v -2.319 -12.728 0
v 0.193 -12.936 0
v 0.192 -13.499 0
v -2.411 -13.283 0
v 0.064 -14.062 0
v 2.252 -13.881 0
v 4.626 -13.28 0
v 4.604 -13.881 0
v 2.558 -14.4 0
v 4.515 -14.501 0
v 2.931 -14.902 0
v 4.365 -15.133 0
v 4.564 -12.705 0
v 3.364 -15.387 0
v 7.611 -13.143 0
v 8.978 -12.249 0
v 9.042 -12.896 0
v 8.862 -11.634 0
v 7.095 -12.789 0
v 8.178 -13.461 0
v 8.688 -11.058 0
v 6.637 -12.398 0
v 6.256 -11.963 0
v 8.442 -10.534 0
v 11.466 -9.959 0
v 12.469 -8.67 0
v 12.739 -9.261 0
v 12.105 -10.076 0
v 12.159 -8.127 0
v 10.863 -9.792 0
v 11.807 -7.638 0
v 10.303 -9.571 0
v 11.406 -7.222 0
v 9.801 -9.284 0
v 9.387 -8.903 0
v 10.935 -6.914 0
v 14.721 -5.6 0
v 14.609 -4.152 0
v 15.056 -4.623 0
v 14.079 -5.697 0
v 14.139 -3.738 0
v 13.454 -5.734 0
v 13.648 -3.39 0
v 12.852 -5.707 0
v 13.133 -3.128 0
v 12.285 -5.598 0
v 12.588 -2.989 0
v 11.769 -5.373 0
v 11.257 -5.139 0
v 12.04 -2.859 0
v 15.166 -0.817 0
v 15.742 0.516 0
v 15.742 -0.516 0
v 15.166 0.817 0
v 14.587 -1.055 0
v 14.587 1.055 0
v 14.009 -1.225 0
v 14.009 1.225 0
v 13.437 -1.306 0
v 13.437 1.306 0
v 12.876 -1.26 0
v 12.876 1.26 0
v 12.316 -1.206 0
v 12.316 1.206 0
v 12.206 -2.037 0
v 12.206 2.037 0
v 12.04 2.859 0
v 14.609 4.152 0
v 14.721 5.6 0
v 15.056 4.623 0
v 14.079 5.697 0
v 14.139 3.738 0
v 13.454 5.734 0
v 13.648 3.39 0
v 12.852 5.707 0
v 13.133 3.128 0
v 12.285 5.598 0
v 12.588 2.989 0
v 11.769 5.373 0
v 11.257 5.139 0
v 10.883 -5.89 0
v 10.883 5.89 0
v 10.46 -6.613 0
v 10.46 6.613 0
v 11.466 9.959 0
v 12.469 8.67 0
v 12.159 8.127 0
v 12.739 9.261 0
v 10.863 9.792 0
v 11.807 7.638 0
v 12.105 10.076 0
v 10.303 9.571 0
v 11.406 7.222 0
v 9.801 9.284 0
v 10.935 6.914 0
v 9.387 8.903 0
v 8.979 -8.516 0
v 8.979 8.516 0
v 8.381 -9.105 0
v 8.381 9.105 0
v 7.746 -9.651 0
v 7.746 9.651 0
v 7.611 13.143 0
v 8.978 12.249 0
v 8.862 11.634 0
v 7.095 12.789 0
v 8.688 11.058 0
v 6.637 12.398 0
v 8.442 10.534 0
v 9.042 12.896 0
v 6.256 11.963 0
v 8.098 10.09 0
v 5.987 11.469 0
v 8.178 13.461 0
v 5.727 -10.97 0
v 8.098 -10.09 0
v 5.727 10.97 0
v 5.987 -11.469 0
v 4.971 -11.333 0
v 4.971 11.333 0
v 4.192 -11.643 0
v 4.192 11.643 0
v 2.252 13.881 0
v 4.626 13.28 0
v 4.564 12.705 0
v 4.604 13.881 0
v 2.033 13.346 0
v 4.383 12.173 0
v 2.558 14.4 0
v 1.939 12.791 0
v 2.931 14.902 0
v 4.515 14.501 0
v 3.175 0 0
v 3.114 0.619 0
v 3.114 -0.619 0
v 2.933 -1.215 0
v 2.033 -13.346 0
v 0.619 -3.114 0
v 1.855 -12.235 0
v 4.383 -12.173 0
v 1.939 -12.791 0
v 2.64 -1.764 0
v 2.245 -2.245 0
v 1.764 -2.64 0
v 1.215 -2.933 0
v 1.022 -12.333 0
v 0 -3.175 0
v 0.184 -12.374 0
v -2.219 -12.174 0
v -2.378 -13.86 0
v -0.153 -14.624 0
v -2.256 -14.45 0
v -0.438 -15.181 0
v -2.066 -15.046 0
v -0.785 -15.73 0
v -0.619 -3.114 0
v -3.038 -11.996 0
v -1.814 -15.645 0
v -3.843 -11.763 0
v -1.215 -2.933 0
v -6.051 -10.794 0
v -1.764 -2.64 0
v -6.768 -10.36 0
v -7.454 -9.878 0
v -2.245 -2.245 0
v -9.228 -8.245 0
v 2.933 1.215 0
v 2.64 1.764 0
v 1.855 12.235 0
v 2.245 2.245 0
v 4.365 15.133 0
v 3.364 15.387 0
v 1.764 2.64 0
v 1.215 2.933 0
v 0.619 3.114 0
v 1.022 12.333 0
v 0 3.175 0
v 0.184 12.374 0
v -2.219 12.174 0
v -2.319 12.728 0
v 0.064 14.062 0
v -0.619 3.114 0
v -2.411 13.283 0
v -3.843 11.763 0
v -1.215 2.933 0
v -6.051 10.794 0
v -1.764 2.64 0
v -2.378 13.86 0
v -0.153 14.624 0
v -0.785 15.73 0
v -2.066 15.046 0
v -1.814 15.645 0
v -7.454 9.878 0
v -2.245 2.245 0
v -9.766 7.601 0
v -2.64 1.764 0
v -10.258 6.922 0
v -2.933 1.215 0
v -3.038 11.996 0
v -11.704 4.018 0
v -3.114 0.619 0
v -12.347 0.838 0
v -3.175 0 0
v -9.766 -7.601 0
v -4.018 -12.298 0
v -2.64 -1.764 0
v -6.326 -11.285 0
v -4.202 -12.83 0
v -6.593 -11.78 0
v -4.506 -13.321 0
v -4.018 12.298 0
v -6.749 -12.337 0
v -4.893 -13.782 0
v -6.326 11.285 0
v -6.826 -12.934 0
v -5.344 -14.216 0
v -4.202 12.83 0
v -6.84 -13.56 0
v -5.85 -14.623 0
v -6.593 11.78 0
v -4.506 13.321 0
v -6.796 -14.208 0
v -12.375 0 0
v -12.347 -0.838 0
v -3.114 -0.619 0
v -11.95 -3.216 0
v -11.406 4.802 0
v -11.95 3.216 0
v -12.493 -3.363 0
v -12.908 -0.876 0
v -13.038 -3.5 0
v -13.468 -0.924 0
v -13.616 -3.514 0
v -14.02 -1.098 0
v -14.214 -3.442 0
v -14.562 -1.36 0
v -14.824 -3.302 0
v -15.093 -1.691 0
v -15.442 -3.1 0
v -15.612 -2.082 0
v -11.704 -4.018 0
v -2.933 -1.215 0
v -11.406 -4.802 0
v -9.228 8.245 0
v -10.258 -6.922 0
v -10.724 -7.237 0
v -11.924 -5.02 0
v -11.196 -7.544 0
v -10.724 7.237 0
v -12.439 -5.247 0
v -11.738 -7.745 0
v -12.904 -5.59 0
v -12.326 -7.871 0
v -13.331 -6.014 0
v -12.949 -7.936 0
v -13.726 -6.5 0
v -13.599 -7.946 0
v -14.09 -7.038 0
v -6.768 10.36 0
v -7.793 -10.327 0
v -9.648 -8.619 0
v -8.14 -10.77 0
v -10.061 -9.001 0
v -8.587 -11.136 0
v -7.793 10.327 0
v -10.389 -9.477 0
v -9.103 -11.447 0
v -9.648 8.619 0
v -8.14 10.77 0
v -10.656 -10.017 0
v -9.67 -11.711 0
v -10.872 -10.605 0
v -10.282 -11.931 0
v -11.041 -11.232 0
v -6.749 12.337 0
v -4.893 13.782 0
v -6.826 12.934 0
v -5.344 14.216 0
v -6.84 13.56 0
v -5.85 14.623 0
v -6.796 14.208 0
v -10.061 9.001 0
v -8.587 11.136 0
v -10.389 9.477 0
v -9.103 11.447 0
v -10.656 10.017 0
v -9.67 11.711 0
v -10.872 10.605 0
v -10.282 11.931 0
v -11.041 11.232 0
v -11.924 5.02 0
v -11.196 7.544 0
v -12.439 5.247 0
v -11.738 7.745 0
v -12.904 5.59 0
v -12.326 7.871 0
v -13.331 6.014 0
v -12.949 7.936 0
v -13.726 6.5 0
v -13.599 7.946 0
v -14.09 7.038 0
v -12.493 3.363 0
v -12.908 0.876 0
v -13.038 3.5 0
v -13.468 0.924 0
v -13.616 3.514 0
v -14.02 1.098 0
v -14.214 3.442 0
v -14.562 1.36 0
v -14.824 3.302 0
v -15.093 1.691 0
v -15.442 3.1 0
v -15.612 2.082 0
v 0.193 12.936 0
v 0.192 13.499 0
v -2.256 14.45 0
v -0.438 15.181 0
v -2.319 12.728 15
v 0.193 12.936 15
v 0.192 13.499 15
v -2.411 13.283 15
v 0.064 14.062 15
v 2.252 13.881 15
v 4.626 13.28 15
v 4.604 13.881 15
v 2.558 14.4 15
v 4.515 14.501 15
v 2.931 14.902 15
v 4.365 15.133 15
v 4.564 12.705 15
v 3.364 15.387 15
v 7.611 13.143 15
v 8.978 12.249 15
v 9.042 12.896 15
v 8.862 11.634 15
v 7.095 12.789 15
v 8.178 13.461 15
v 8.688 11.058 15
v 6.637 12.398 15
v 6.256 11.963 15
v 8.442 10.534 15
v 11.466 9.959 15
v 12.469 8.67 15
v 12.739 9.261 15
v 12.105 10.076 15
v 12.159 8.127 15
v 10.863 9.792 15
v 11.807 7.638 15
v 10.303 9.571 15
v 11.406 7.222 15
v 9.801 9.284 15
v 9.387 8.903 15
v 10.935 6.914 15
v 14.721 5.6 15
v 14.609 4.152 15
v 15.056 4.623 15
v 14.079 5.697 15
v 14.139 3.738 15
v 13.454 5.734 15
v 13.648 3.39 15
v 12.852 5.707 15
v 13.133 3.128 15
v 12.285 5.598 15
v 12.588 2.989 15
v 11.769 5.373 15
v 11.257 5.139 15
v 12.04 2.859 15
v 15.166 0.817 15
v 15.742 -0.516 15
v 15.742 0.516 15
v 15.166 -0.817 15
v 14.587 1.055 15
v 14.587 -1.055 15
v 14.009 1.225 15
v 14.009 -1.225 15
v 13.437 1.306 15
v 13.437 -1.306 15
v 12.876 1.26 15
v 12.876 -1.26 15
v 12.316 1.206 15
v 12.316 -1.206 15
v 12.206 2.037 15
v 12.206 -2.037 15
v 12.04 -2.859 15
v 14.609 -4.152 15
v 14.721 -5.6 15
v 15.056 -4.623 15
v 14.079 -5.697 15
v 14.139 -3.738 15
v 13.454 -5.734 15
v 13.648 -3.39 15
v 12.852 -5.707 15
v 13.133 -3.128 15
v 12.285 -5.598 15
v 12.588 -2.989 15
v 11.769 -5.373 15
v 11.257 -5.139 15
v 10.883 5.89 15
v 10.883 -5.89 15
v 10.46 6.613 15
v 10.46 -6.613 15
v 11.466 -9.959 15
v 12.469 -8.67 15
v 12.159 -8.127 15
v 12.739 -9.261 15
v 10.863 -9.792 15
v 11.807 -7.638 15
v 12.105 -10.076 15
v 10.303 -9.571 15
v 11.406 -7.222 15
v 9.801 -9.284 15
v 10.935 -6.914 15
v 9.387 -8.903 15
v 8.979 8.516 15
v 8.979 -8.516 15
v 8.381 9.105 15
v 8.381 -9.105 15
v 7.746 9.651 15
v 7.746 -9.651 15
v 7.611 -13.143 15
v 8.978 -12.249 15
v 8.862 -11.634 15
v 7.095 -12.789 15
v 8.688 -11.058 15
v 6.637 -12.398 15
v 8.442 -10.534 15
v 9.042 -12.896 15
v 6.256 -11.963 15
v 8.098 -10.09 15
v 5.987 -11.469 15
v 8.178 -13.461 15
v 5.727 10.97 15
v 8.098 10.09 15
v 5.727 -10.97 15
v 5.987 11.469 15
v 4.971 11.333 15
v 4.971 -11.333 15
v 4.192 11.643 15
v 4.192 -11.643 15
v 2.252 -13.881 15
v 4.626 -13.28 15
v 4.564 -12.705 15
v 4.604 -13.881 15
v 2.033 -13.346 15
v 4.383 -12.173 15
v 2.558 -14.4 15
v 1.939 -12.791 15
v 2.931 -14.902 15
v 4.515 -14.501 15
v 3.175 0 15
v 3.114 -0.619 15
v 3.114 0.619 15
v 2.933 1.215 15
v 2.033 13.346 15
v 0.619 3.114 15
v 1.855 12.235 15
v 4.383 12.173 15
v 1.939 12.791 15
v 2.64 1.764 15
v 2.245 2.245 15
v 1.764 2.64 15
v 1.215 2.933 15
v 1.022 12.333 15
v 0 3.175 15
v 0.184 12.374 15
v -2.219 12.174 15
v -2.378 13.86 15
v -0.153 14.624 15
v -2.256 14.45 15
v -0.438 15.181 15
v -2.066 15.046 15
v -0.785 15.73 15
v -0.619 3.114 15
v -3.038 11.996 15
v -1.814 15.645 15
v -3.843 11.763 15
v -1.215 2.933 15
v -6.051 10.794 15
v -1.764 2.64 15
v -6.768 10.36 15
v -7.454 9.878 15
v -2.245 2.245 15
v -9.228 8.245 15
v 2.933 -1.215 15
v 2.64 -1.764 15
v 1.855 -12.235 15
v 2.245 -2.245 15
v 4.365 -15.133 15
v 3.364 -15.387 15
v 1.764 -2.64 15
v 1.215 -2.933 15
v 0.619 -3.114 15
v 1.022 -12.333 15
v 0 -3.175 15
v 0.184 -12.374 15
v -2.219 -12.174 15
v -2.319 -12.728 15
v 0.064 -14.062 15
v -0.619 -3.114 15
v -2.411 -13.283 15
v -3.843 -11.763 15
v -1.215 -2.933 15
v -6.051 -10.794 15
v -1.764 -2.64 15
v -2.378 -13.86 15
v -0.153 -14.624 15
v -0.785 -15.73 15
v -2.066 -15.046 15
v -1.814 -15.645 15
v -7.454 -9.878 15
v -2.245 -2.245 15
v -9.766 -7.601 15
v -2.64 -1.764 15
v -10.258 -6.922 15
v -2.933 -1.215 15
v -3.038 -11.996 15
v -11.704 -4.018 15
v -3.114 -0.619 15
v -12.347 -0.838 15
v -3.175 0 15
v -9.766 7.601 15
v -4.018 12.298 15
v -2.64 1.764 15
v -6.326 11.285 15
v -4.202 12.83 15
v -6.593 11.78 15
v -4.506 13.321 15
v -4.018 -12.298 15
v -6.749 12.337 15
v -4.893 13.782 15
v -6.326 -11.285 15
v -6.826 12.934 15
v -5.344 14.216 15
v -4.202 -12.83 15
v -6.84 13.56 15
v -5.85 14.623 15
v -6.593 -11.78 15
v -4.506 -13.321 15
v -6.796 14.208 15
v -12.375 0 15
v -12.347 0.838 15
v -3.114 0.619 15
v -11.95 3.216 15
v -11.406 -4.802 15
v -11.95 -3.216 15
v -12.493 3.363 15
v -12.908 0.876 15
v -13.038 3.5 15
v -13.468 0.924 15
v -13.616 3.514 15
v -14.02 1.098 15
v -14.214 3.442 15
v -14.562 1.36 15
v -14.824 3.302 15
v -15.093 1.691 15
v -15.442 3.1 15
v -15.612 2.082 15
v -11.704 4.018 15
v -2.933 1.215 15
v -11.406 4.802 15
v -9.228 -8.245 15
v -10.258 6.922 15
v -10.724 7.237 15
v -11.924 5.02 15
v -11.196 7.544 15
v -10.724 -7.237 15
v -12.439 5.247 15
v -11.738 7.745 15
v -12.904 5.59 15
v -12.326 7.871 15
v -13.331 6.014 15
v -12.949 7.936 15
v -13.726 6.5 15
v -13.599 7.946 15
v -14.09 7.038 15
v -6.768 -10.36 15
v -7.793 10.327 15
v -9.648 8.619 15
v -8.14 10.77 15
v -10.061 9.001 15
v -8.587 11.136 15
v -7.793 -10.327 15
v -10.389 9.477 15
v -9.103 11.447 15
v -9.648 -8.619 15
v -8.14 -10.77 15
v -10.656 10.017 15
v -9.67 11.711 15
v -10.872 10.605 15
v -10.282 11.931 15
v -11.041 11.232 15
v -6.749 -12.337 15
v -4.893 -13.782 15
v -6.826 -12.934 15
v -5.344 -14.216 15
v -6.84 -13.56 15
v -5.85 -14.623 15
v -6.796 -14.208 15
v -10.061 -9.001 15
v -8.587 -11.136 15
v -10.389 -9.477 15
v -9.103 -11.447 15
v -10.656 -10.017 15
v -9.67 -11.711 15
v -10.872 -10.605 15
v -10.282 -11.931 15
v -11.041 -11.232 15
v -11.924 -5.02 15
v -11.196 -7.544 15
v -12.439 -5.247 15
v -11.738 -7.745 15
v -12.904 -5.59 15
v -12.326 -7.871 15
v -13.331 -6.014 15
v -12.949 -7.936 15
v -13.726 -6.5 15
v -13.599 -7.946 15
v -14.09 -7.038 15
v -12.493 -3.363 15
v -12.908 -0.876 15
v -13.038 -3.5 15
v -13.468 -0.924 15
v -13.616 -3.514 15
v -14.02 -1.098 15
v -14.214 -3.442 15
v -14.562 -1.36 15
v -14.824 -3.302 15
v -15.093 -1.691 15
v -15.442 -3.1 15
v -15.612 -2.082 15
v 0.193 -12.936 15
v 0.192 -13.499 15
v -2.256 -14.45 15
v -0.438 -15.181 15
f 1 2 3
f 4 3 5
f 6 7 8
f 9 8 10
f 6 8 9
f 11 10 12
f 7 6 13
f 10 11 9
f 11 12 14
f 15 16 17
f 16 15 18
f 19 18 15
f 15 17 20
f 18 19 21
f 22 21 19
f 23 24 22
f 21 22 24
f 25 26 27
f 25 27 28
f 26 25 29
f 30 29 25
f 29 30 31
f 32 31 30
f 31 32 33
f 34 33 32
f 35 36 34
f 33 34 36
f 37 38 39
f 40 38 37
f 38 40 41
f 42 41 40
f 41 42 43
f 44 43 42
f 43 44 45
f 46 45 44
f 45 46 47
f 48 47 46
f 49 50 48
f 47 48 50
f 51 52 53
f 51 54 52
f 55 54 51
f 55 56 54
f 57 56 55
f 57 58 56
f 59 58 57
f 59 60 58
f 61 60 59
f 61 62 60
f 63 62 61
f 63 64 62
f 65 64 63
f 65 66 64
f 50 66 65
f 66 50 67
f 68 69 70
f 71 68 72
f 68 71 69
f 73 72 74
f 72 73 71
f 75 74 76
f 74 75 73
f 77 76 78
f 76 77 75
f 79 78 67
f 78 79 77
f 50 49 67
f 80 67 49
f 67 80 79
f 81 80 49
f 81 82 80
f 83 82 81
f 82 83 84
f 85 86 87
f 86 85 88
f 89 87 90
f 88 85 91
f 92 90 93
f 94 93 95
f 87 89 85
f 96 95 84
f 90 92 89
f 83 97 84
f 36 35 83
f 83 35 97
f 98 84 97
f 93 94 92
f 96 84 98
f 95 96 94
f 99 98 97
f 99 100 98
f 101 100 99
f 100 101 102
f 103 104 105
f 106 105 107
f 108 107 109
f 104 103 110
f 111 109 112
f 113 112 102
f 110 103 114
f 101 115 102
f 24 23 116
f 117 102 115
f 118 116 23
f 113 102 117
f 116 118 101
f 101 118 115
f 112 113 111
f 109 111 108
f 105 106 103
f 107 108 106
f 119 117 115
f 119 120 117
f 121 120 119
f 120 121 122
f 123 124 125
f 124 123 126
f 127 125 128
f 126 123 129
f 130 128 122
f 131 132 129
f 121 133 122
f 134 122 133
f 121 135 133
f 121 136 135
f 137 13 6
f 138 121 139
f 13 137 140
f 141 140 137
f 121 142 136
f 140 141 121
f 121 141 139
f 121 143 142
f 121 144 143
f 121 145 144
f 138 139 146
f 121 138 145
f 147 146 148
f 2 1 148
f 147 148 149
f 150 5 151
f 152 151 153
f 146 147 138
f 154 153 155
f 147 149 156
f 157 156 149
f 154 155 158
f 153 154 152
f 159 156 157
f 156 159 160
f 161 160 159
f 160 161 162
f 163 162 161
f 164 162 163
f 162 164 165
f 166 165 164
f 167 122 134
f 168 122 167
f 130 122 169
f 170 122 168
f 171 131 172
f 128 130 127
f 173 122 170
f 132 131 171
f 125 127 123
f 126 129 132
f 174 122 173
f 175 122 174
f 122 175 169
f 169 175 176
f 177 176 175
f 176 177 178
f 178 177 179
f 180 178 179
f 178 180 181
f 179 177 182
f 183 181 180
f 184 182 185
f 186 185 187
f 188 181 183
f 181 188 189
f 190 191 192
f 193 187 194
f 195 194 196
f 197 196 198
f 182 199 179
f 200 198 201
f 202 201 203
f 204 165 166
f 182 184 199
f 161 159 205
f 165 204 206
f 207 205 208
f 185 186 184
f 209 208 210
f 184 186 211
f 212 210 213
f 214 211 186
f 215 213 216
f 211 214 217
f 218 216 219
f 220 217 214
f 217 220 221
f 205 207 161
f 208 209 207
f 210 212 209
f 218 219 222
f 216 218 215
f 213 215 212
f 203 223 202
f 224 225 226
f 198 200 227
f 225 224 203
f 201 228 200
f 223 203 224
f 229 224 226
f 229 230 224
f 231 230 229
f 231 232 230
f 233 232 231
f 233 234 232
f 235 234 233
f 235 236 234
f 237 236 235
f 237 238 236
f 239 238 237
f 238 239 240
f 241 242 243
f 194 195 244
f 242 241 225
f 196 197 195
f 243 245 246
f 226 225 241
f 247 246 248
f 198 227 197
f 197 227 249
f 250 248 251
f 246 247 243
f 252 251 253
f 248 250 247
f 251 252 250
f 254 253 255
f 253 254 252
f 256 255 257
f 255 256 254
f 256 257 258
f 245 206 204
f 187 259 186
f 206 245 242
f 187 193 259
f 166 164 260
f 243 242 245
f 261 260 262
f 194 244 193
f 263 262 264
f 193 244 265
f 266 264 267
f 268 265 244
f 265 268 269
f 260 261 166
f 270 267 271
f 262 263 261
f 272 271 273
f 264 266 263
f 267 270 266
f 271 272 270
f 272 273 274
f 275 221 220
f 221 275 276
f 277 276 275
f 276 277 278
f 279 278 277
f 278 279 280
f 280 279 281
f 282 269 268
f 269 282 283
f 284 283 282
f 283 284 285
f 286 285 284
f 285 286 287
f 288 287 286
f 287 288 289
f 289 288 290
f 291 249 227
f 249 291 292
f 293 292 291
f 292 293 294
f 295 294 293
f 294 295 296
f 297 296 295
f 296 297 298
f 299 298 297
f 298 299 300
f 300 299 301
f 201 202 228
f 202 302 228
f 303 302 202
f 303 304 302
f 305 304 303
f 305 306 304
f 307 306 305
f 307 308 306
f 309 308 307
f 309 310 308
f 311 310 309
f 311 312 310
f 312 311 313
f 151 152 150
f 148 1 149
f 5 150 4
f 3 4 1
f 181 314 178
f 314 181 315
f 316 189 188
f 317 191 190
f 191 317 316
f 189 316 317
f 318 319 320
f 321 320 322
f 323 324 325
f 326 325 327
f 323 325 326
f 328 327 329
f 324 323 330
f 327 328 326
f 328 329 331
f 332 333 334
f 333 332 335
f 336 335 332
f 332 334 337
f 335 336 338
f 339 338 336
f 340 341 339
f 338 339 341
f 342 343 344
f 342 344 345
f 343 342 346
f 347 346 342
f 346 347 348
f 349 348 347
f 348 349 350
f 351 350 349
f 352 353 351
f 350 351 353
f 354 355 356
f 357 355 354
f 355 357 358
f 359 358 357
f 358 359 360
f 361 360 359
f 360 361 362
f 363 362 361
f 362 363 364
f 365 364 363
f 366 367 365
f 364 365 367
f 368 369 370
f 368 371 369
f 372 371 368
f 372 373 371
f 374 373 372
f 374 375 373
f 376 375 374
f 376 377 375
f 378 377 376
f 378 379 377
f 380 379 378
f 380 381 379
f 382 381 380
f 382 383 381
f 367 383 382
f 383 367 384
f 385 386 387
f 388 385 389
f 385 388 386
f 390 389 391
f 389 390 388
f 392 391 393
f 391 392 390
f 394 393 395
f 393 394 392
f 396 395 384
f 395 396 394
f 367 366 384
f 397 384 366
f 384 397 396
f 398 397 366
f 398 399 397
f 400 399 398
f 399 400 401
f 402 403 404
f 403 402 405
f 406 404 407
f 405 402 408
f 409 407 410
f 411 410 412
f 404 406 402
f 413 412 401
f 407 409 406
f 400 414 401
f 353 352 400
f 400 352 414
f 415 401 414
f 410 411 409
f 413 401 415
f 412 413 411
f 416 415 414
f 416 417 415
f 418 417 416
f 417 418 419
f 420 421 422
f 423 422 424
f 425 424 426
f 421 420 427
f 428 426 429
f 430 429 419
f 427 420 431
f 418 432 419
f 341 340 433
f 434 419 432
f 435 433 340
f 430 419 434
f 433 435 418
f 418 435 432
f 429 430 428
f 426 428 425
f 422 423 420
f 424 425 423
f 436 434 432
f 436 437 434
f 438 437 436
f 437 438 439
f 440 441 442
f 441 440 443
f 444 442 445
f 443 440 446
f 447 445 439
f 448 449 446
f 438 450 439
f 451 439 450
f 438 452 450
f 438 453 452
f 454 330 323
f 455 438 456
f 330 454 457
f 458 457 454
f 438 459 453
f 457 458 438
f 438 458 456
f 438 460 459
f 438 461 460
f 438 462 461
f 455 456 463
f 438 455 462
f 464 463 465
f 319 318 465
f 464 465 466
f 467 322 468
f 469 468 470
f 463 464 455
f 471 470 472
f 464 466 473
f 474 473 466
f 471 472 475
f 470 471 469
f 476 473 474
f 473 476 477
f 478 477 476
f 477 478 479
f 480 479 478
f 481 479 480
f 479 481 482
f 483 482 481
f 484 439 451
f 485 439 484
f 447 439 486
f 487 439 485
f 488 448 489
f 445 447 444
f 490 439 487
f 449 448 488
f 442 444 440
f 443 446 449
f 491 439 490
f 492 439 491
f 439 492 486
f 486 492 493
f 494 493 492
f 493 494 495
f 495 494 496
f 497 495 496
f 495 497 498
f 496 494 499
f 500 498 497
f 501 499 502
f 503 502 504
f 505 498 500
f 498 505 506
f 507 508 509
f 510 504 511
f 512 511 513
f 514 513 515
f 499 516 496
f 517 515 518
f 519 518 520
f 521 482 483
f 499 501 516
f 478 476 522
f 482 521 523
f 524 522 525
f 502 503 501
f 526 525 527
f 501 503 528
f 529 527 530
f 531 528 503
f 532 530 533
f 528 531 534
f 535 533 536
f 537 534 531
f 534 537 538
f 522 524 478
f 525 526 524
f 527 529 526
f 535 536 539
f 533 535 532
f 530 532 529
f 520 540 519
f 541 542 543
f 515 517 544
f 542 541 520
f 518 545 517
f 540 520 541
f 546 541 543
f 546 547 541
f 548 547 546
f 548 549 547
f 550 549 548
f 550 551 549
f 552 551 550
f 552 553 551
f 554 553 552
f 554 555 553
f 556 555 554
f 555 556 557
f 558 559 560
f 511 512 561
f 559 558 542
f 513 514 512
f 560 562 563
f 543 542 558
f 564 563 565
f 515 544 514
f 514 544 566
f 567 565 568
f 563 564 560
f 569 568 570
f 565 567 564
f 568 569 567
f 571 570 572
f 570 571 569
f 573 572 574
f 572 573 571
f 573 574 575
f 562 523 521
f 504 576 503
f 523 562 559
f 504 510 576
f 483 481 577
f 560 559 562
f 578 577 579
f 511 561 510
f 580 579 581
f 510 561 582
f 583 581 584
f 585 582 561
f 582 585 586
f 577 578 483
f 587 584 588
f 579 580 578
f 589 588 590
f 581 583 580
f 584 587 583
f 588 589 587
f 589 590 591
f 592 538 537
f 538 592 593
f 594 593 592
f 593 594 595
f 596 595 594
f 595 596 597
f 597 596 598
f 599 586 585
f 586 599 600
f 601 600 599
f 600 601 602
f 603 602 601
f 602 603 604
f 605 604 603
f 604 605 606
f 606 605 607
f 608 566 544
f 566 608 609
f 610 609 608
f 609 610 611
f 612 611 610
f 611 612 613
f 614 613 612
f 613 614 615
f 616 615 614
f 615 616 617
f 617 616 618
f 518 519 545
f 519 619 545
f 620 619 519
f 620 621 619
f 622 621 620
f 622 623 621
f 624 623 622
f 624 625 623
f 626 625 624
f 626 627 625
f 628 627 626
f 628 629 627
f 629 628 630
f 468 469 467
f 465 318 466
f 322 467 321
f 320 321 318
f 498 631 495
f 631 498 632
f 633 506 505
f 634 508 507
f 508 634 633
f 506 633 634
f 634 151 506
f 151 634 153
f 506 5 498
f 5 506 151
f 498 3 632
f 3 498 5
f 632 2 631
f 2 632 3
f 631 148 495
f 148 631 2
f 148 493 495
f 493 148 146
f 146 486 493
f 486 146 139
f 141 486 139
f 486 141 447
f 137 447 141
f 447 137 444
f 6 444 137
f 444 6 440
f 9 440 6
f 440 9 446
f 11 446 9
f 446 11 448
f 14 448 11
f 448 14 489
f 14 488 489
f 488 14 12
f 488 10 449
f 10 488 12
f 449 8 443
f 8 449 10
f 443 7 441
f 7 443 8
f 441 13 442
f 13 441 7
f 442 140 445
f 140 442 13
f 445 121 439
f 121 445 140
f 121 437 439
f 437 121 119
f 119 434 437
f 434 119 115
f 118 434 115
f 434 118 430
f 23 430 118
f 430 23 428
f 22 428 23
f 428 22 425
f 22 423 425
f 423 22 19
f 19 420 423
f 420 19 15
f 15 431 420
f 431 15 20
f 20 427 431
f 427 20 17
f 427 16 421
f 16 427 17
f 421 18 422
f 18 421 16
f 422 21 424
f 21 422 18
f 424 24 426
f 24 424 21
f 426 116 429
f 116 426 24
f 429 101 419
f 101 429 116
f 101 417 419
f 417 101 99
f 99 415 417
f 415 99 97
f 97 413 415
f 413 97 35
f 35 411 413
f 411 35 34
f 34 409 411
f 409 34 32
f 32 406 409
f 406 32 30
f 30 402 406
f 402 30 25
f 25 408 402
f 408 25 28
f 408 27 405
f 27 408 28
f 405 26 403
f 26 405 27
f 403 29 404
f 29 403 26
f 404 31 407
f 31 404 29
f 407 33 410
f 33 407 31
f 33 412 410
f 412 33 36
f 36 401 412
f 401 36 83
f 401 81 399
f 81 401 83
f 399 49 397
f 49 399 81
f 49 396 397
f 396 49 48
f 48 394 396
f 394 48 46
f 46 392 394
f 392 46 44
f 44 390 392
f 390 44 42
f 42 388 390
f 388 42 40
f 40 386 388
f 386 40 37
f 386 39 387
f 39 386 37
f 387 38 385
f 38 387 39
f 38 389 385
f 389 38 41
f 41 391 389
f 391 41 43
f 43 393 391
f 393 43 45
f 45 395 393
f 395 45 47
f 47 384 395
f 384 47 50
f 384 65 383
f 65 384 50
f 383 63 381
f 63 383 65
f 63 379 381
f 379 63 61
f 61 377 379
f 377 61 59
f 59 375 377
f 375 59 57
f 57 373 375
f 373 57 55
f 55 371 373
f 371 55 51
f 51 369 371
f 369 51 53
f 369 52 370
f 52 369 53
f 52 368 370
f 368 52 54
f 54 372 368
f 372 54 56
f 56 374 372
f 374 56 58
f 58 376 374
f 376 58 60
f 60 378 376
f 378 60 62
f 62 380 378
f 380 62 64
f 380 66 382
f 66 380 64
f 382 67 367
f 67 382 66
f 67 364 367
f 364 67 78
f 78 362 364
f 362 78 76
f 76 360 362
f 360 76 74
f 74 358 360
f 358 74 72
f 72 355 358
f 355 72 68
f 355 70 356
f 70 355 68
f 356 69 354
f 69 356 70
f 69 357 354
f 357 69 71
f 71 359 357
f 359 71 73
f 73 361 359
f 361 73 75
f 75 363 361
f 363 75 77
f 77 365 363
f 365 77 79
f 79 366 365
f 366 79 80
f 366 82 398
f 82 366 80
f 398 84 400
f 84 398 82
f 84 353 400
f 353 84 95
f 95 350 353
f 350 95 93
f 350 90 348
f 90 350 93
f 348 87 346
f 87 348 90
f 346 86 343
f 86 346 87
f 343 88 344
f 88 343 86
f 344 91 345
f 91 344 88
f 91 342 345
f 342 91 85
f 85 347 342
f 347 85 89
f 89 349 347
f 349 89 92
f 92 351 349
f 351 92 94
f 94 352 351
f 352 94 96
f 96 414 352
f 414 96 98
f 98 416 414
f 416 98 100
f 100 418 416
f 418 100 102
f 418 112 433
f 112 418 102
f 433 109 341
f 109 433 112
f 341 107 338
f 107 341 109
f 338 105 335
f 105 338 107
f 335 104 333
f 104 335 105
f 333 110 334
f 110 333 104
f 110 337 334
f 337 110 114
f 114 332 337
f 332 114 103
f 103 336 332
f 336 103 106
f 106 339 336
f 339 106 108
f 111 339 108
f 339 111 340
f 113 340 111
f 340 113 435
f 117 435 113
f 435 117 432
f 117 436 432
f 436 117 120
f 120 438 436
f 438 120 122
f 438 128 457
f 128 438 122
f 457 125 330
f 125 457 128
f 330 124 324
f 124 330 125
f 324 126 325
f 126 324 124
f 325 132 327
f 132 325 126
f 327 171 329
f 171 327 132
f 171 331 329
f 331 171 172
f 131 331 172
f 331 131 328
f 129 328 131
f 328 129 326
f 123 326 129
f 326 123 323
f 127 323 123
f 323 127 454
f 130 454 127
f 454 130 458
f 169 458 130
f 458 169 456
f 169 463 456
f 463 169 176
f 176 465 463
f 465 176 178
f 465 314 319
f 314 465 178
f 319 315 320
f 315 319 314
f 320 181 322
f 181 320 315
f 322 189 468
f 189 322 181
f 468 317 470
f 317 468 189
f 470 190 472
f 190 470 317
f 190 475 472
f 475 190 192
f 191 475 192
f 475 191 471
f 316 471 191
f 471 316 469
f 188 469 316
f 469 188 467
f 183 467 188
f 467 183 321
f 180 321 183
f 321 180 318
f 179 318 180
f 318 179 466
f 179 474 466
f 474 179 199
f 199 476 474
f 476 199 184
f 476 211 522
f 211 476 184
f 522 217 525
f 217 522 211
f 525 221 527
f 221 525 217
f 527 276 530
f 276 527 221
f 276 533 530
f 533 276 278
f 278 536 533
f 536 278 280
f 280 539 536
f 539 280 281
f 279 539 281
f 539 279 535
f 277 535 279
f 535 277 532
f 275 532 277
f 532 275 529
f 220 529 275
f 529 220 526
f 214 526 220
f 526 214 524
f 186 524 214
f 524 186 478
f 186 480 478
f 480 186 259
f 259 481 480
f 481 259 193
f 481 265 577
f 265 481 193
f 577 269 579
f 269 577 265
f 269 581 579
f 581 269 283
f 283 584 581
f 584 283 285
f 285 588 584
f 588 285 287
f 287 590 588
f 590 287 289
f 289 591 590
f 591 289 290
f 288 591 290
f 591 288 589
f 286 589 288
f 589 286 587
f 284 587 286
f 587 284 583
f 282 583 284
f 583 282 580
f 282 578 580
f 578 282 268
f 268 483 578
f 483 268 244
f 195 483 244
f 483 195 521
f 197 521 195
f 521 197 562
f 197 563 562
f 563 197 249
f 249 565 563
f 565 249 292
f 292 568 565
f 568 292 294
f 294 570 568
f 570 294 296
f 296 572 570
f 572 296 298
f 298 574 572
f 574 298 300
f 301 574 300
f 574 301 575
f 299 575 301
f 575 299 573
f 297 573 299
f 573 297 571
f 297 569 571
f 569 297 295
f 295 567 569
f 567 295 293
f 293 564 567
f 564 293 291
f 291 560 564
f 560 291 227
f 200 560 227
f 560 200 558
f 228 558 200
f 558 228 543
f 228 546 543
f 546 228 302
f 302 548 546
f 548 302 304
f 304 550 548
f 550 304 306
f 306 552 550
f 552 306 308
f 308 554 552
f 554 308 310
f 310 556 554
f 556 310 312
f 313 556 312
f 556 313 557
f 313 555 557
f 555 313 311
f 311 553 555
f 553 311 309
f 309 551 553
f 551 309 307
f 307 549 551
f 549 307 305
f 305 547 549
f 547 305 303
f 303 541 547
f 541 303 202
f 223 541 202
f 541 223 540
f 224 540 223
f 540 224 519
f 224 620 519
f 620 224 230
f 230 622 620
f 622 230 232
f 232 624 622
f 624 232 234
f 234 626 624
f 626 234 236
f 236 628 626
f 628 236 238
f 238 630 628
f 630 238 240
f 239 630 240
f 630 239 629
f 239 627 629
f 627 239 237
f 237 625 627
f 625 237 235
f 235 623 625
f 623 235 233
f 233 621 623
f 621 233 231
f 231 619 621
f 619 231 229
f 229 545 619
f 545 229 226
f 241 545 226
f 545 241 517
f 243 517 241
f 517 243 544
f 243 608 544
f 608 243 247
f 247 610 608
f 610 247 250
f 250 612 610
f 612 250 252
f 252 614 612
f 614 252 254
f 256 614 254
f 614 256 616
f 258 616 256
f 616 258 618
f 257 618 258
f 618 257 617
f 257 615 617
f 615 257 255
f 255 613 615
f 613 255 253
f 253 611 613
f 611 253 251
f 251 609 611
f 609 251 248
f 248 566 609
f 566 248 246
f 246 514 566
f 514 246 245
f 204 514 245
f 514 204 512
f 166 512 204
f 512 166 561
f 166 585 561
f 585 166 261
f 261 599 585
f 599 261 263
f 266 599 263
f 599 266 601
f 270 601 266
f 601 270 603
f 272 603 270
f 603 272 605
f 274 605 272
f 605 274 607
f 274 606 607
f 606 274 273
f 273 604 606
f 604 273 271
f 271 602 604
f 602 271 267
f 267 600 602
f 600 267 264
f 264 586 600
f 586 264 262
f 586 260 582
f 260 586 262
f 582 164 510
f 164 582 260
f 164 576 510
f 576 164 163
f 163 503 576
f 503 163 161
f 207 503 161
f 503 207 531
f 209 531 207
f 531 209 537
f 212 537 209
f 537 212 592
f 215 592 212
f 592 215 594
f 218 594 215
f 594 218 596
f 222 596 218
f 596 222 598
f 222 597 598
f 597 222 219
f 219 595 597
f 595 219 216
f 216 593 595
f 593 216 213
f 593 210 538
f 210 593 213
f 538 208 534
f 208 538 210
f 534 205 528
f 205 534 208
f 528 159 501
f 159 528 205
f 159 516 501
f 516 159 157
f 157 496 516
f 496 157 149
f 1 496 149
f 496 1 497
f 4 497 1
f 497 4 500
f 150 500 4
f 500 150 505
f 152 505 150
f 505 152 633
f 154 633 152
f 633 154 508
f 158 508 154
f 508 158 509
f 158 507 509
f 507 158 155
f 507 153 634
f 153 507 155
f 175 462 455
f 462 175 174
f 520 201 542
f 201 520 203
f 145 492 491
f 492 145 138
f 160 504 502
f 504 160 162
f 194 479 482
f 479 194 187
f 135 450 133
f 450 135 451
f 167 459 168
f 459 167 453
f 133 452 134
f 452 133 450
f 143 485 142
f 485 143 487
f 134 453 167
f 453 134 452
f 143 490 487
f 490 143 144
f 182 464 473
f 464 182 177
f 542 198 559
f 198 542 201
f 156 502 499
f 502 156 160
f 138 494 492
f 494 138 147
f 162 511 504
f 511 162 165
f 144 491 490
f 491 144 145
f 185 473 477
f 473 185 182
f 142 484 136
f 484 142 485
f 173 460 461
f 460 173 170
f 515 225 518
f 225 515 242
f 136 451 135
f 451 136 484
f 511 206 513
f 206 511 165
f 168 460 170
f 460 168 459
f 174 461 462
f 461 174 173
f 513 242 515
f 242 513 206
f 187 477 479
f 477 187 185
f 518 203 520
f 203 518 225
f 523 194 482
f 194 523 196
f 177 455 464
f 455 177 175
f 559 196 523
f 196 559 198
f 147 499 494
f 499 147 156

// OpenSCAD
$fn = 32;

// ----------------------------------------------------------------------
// Spur gear: m=1.5 z=19, 31.5 mm tip diameter x 15 mm
// ----------------------------------------------------------------------

// --- parameters (mm) ---
gear_module = 1.5;        // module
tooth_count = 19;         // number of teeth
gear_w = 15;              // face width
pa = 20;                  // pressure angle, deg
bore = 6.35;              // shaft bore

/* --- involute profile --- */
pitch_r = gear_module * tooth_count / 2;
base_r = pitch_r * cos(pa);
tip_r = pitch_r + gear_module;
root_r = pitch_r - 1.25 * gear_module;
flank_steps = 6;

function inv_deg(a) = (tan(a) - a * PI / 180) * 180 / PI;
function flank_r(i) = root_r + (tip_r - root_r) * i / flank_steps;
function half_angle(r) = 90 / tooth_count + inv_deg(pa) - inv_deg(acos(min(1, base_r / r)));
function tooth_pt(k, i, side) =
    let (r = flank_r(i), a = k * 360 / tooth_count + side * half_angle(r))
    [r * cos(a), r * sin(a)];

module tooth_profile() {
  polygon(points = [
    for (k = [0 : tooth_count - 1])
      each [
        for (i = [0 : flank_steps]) tooth_pt(k, i, -1),
        for (i = [flank_steps : -1 : 0]) tooth_pt(k, i, 1),
        let (ta = (k + 0.5) * 360 / tooth_count)
          [root_r * cos(ta), root_r * sin(ta)]
      ]
  ]);
}

module gear_disc() {
  linear_extrude(height = gear_w) tooth_profile();
}

difference() {
  gear_disc();
  translate([0, 0, -1]) cylinder(h = gear_w + 3, d = bore);
}
